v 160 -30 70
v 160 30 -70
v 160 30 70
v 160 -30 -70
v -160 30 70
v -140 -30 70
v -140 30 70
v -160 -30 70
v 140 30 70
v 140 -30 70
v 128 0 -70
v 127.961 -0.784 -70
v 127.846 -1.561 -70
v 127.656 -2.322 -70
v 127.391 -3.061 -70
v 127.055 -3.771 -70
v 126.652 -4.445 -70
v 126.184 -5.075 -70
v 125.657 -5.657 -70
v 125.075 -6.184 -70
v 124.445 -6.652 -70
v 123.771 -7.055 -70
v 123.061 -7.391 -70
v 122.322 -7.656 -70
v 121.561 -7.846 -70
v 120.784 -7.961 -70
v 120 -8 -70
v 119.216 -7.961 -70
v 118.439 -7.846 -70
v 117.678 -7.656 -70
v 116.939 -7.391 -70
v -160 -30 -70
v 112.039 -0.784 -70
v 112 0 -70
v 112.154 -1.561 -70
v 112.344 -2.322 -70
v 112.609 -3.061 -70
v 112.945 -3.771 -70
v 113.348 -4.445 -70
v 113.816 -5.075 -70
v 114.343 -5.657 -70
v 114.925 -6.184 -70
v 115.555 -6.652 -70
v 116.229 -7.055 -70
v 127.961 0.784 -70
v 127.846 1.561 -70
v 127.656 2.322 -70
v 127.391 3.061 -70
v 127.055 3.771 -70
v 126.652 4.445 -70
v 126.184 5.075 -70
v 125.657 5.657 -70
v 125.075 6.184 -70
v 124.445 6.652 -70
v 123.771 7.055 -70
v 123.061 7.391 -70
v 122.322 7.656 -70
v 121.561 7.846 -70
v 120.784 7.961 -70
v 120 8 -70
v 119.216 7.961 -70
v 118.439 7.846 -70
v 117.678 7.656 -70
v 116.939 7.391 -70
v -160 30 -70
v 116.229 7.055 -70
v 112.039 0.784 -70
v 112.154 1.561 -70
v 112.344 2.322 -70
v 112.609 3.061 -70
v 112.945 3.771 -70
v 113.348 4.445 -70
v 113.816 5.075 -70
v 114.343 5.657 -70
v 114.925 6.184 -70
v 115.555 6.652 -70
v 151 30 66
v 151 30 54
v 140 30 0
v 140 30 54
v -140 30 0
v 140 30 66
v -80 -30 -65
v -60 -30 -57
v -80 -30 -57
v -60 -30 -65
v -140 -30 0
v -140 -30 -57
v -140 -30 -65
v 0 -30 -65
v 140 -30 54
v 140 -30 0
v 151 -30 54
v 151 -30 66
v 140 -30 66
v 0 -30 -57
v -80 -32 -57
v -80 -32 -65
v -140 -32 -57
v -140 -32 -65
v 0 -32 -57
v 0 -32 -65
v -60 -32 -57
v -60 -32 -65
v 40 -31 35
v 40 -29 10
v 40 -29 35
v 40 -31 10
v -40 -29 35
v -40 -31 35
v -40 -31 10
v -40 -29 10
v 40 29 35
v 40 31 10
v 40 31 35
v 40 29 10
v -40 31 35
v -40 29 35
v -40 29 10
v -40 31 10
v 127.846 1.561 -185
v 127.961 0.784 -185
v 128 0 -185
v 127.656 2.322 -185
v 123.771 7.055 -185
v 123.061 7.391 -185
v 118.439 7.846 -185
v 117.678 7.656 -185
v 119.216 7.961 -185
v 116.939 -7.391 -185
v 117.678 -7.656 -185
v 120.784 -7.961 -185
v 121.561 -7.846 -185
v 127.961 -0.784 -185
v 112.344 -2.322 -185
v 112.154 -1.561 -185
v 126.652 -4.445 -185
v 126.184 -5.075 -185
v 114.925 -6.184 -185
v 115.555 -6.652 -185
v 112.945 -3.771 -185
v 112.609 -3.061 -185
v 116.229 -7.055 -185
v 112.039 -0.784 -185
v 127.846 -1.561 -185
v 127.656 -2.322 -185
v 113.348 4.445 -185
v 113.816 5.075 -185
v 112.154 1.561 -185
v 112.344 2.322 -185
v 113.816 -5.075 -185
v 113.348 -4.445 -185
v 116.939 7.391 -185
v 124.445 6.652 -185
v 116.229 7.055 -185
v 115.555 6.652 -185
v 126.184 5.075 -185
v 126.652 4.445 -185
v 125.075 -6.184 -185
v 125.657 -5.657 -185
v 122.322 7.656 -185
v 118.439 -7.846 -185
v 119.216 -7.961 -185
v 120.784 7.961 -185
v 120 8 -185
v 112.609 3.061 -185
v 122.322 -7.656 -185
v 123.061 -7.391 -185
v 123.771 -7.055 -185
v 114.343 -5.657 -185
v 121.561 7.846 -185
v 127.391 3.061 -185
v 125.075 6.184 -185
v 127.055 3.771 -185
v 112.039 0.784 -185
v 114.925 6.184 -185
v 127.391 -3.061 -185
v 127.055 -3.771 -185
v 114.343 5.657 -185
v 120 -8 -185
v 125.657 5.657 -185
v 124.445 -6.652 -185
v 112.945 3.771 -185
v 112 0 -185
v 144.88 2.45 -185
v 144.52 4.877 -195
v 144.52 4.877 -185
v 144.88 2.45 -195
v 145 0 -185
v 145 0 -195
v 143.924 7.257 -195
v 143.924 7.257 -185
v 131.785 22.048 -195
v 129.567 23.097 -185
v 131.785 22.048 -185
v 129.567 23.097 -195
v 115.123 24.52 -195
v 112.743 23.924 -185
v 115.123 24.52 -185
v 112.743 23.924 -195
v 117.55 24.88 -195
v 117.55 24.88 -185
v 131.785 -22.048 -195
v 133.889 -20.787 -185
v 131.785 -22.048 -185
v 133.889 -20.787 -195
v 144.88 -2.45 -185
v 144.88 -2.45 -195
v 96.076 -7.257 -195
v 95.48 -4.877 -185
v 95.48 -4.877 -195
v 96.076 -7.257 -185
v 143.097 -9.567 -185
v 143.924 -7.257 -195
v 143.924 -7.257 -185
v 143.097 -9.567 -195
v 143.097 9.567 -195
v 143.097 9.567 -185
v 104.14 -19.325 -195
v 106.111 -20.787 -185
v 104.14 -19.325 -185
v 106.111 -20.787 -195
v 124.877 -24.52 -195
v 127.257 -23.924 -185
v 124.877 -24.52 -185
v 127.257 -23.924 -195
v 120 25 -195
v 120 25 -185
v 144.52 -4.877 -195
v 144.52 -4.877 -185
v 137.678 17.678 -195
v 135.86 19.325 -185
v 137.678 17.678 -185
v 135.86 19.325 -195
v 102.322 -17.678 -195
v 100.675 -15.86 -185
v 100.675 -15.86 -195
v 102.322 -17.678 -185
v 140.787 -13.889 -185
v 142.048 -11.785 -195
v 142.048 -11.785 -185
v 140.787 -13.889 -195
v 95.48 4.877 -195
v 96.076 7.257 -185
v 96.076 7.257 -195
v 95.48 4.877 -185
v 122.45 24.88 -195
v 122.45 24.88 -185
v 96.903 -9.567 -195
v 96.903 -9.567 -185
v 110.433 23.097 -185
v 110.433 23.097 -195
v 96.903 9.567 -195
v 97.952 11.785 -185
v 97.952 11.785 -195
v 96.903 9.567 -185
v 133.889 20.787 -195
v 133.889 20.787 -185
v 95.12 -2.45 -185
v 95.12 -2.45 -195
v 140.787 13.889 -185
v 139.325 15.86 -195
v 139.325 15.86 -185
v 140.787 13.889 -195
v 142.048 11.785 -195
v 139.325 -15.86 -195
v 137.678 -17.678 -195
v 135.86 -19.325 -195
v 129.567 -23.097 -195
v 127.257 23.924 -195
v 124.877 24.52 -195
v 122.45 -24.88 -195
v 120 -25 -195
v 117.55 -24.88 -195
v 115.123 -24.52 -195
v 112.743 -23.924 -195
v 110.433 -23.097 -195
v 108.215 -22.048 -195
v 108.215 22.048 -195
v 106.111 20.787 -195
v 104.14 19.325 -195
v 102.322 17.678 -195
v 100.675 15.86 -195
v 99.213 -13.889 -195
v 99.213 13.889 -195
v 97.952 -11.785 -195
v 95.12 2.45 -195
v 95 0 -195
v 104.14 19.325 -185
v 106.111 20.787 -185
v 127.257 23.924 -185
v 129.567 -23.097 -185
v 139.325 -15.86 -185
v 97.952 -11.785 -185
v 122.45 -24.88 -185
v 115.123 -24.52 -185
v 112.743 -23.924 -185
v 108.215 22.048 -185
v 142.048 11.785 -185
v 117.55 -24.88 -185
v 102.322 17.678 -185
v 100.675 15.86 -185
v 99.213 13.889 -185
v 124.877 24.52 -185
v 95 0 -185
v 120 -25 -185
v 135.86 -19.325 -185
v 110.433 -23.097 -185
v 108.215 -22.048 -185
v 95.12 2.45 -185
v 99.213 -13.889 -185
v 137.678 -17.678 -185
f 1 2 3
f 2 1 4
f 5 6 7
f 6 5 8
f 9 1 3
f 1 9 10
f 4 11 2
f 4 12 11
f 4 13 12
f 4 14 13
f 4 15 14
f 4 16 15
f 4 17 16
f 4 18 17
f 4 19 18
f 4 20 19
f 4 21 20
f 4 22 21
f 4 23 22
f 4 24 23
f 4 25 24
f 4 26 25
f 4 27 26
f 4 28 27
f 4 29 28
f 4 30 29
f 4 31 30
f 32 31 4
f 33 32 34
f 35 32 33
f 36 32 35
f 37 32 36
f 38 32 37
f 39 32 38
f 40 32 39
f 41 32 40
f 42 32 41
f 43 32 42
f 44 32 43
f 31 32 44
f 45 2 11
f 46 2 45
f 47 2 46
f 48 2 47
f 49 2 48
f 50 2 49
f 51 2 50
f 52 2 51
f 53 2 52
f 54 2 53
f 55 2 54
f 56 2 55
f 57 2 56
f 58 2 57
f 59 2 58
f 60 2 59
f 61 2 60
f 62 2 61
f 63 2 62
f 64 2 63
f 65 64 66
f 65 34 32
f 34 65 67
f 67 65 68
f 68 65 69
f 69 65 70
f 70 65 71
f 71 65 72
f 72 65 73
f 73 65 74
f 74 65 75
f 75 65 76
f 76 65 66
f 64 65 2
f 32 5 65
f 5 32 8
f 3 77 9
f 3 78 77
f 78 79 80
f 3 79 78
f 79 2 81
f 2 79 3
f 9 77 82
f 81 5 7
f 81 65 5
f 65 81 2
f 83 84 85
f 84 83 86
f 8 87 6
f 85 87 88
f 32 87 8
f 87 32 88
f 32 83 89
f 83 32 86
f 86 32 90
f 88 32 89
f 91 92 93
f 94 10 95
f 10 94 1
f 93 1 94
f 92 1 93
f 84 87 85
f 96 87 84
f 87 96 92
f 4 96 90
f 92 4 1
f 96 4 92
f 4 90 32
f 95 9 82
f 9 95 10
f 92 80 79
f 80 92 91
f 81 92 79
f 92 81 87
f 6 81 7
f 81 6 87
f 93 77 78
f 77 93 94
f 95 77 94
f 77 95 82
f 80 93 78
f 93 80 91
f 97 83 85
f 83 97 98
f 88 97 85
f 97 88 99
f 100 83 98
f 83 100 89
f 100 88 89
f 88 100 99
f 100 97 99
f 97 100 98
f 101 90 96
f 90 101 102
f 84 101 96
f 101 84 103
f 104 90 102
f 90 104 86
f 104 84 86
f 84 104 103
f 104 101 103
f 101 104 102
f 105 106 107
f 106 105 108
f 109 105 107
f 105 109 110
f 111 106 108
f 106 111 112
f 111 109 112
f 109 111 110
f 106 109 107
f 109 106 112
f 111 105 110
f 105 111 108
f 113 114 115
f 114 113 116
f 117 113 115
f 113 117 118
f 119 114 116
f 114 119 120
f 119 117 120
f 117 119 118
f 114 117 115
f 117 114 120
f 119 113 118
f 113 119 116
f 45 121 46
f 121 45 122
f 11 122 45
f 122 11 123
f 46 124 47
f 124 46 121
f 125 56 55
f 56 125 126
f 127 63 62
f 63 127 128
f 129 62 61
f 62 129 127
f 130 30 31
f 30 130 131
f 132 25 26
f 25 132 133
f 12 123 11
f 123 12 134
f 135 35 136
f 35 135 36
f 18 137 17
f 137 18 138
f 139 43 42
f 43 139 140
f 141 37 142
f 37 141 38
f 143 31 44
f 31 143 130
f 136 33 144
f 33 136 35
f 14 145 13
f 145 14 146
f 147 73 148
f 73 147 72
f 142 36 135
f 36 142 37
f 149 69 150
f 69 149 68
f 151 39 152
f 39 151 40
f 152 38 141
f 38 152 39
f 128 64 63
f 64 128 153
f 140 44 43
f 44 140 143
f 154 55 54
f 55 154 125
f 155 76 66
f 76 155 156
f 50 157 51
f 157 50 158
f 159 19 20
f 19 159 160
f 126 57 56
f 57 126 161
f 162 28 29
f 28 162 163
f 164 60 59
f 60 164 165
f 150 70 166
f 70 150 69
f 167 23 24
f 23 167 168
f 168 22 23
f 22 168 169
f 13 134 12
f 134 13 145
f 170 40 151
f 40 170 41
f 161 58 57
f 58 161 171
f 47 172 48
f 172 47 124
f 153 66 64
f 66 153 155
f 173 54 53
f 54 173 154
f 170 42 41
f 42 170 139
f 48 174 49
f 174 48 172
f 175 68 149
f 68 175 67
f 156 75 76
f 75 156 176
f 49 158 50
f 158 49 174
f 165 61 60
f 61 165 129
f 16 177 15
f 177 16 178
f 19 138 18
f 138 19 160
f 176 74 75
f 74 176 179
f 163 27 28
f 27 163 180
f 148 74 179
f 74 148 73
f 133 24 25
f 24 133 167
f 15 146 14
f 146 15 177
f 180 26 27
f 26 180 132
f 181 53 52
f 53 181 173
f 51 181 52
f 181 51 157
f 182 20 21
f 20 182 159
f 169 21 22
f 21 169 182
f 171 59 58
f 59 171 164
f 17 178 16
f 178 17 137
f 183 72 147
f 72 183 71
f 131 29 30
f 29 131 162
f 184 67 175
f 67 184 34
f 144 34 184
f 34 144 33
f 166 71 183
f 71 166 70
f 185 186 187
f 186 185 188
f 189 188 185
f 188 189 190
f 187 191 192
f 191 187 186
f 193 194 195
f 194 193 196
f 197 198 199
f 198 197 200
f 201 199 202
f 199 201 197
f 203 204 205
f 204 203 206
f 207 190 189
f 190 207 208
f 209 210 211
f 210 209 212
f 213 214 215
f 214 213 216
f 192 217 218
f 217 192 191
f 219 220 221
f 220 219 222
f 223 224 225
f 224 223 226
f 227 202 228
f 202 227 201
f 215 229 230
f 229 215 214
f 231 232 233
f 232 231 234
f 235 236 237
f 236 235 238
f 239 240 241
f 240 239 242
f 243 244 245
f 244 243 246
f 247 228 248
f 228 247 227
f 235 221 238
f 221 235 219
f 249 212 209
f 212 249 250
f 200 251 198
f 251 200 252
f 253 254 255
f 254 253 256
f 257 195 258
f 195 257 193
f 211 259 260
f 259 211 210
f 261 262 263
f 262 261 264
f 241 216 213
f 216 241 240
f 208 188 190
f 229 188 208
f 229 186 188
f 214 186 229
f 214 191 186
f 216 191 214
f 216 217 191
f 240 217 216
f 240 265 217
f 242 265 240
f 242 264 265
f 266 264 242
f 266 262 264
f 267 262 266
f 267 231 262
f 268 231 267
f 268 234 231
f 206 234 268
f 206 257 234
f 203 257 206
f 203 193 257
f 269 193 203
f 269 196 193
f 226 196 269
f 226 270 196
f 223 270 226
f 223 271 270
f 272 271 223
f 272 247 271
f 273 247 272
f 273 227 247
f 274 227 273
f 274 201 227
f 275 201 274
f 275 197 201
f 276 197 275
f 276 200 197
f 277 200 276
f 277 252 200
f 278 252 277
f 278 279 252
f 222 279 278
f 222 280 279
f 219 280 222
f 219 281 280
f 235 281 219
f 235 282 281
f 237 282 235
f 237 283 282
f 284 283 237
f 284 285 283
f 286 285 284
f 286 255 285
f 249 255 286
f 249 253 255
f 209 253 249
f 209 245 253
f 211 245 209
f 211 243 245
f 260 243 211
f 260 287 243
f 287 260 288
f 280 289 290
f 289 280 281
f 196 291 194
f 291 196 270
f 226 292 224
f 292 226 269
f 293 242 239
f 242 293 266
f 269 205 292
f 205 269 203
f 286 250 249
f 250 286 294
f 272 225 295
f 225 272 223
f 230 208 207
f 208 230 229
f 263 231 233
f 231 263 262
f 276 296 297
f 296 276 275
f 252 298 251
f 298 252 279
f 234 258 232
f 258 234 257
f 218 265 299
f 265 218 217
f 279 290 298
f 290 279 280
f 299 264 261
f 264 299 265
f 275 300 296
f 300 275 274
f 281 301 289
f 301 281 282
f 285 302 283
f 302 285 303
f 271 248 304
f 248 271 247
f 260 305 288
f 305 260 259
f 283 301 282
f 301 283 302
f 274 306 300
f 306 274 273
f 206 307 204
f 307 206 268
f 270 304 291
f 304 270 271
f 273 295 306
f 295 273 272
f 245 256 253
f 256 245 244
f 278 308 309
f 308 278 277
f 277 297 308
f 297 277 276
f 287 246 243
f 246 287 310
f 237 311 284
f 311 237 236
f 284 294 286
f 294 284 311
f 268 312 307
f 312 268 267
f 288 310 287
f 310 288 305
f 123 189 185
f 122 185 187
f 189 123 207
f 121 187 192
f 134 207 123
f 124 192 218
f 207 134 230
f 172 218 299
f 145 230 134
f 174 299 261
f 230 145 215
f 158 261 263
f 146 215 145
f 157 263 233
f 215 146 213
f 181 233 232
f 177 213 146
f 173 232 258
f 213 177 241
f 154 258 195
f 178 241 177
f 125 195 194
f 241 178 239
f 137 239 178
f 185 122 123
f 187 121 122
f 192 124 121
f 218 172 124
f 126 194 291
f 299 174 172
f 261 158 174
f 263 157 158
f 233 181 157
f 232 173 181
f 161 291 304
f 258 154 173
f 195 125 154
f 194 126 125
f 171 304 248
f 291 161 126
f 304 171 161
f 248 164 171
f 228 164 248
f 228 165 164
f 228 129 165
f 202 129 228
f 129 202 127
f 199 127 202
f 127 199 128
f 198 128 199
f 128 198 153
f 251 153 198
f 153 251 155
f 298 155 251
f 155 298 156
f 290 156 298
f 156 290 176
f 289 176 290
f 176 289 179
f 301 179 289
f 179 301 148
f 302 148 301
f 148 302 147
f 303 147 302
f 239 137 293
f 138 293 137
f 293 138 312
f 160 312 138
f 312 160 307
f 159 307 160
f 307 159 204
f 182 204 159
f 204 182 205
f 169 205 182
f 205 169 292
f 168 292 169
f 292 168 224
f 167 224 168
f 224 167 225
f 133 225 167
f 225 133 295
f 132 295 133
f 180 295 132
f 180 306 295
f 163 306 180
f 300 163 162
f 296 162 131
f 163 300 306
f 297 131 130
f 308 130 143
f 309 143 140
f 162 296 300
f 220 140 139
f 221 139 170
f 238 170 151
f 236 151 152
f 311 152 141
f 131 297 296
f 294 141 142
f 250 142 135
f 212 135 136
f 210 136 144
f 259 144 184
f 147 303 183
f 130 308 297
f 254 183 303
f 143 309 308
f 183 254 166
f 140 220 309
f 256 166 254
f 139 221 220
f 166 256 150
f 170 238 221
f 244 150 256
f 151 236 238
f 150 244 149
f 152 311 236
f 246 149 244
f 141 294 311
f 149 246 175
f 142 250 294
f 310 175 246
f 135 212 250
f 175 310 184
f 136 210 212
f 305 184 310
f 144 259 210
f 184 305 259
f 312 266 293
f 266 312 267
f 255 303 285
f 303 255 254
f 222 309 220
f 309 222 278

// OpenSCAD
// ============================================================================
// RT Architecture: Over-Engineered TUF Hexadecimal GPU Structural Chassis
// ============================================================================

$fn = 64;

// Module selector: "slim", "server", or "monster"
variant = "monster"; 

module gpu_core_chassis(type) {
    // Structural Base Dimensions
    length = 320;
    height = 140;
    
    // Set thickness factor based on card slots (1 slot = 20mm, 2 = 40mm, 3 = 60mm)
    thickness = (type == "slim") ? 20 : ((type == "server") ? 40 : 60);
    
    echo("Synthesizing Layout for Variant Target: ", type, "Thickness: ", thickness, "mm");

    difference() {
        // Main TUF Aluminum Armor Enclosure Block
        color([0.15, 0.15, 0.15]) 
            cube([length, thickness, height], center=true);
        
        // Extrude Outflow Channels for Heavy Thermal Vapor Shrouds
        translate([0, 0, height/4])
            cube([length - 40, thickness + 2, height/2], center=true);
            
        // Cutout for the Embedded M.2 SLI-Snap Interconnect Bridge
        translate([length/2 - 30, 0, height/2 - 10])
            cube([42, thickness + 5, 12], center=true);
    }
    
    // Model the Thick 3oz High-Current Board Input Leads
    color([0.85, 0.65, 0.15]) { // Gold/Copper tracking
        translate([-length/2 + 20, -thickness/2 - 2, -height/2 + 5])
            cube([60, 4, 8]);
        translate([-length/2 + 100, -thickness/2 - 2, -height/2 + 5])
            cube([60, 4, 8]);
    }
    
    // Model the Addressable LED-illuminated Hexadecimal CAMM2 Memory Blocks
    color([0.2, 0.8, 1.0]) { // LED Cyan glow lines
        translate([-40, -thickness/2 - 1, 10]) cube([80, 2, 25]);
        translate([-40, thickness/2 - 1, 10]) cube([80, 2, 25]);
    }

    // Conditional Component: Add the Heavy Peg-Leg Support Stand for the 3-Slot Monster
    if (type == "monster") {
        color([0.3, 0.3, 0.3]) {
            // Drop bracket connection arm down to desk surface boundary
            translate([length/2 - 40, 0, -height/2 - 60])
                cylinder(h=120, r=8, center=true);
            // Solid base foot pad
            translate([length/2 - 40, 0, -height/2 - 120])
                cylinder(h=10, r=25, center=true);
        }
        echo("[STRUCTURAL WARNING] Peg-Leg deployment required to prevent PCIe socket shear.");
    }
}

// Instantiate target block
gpu_core_chassis(variant);
